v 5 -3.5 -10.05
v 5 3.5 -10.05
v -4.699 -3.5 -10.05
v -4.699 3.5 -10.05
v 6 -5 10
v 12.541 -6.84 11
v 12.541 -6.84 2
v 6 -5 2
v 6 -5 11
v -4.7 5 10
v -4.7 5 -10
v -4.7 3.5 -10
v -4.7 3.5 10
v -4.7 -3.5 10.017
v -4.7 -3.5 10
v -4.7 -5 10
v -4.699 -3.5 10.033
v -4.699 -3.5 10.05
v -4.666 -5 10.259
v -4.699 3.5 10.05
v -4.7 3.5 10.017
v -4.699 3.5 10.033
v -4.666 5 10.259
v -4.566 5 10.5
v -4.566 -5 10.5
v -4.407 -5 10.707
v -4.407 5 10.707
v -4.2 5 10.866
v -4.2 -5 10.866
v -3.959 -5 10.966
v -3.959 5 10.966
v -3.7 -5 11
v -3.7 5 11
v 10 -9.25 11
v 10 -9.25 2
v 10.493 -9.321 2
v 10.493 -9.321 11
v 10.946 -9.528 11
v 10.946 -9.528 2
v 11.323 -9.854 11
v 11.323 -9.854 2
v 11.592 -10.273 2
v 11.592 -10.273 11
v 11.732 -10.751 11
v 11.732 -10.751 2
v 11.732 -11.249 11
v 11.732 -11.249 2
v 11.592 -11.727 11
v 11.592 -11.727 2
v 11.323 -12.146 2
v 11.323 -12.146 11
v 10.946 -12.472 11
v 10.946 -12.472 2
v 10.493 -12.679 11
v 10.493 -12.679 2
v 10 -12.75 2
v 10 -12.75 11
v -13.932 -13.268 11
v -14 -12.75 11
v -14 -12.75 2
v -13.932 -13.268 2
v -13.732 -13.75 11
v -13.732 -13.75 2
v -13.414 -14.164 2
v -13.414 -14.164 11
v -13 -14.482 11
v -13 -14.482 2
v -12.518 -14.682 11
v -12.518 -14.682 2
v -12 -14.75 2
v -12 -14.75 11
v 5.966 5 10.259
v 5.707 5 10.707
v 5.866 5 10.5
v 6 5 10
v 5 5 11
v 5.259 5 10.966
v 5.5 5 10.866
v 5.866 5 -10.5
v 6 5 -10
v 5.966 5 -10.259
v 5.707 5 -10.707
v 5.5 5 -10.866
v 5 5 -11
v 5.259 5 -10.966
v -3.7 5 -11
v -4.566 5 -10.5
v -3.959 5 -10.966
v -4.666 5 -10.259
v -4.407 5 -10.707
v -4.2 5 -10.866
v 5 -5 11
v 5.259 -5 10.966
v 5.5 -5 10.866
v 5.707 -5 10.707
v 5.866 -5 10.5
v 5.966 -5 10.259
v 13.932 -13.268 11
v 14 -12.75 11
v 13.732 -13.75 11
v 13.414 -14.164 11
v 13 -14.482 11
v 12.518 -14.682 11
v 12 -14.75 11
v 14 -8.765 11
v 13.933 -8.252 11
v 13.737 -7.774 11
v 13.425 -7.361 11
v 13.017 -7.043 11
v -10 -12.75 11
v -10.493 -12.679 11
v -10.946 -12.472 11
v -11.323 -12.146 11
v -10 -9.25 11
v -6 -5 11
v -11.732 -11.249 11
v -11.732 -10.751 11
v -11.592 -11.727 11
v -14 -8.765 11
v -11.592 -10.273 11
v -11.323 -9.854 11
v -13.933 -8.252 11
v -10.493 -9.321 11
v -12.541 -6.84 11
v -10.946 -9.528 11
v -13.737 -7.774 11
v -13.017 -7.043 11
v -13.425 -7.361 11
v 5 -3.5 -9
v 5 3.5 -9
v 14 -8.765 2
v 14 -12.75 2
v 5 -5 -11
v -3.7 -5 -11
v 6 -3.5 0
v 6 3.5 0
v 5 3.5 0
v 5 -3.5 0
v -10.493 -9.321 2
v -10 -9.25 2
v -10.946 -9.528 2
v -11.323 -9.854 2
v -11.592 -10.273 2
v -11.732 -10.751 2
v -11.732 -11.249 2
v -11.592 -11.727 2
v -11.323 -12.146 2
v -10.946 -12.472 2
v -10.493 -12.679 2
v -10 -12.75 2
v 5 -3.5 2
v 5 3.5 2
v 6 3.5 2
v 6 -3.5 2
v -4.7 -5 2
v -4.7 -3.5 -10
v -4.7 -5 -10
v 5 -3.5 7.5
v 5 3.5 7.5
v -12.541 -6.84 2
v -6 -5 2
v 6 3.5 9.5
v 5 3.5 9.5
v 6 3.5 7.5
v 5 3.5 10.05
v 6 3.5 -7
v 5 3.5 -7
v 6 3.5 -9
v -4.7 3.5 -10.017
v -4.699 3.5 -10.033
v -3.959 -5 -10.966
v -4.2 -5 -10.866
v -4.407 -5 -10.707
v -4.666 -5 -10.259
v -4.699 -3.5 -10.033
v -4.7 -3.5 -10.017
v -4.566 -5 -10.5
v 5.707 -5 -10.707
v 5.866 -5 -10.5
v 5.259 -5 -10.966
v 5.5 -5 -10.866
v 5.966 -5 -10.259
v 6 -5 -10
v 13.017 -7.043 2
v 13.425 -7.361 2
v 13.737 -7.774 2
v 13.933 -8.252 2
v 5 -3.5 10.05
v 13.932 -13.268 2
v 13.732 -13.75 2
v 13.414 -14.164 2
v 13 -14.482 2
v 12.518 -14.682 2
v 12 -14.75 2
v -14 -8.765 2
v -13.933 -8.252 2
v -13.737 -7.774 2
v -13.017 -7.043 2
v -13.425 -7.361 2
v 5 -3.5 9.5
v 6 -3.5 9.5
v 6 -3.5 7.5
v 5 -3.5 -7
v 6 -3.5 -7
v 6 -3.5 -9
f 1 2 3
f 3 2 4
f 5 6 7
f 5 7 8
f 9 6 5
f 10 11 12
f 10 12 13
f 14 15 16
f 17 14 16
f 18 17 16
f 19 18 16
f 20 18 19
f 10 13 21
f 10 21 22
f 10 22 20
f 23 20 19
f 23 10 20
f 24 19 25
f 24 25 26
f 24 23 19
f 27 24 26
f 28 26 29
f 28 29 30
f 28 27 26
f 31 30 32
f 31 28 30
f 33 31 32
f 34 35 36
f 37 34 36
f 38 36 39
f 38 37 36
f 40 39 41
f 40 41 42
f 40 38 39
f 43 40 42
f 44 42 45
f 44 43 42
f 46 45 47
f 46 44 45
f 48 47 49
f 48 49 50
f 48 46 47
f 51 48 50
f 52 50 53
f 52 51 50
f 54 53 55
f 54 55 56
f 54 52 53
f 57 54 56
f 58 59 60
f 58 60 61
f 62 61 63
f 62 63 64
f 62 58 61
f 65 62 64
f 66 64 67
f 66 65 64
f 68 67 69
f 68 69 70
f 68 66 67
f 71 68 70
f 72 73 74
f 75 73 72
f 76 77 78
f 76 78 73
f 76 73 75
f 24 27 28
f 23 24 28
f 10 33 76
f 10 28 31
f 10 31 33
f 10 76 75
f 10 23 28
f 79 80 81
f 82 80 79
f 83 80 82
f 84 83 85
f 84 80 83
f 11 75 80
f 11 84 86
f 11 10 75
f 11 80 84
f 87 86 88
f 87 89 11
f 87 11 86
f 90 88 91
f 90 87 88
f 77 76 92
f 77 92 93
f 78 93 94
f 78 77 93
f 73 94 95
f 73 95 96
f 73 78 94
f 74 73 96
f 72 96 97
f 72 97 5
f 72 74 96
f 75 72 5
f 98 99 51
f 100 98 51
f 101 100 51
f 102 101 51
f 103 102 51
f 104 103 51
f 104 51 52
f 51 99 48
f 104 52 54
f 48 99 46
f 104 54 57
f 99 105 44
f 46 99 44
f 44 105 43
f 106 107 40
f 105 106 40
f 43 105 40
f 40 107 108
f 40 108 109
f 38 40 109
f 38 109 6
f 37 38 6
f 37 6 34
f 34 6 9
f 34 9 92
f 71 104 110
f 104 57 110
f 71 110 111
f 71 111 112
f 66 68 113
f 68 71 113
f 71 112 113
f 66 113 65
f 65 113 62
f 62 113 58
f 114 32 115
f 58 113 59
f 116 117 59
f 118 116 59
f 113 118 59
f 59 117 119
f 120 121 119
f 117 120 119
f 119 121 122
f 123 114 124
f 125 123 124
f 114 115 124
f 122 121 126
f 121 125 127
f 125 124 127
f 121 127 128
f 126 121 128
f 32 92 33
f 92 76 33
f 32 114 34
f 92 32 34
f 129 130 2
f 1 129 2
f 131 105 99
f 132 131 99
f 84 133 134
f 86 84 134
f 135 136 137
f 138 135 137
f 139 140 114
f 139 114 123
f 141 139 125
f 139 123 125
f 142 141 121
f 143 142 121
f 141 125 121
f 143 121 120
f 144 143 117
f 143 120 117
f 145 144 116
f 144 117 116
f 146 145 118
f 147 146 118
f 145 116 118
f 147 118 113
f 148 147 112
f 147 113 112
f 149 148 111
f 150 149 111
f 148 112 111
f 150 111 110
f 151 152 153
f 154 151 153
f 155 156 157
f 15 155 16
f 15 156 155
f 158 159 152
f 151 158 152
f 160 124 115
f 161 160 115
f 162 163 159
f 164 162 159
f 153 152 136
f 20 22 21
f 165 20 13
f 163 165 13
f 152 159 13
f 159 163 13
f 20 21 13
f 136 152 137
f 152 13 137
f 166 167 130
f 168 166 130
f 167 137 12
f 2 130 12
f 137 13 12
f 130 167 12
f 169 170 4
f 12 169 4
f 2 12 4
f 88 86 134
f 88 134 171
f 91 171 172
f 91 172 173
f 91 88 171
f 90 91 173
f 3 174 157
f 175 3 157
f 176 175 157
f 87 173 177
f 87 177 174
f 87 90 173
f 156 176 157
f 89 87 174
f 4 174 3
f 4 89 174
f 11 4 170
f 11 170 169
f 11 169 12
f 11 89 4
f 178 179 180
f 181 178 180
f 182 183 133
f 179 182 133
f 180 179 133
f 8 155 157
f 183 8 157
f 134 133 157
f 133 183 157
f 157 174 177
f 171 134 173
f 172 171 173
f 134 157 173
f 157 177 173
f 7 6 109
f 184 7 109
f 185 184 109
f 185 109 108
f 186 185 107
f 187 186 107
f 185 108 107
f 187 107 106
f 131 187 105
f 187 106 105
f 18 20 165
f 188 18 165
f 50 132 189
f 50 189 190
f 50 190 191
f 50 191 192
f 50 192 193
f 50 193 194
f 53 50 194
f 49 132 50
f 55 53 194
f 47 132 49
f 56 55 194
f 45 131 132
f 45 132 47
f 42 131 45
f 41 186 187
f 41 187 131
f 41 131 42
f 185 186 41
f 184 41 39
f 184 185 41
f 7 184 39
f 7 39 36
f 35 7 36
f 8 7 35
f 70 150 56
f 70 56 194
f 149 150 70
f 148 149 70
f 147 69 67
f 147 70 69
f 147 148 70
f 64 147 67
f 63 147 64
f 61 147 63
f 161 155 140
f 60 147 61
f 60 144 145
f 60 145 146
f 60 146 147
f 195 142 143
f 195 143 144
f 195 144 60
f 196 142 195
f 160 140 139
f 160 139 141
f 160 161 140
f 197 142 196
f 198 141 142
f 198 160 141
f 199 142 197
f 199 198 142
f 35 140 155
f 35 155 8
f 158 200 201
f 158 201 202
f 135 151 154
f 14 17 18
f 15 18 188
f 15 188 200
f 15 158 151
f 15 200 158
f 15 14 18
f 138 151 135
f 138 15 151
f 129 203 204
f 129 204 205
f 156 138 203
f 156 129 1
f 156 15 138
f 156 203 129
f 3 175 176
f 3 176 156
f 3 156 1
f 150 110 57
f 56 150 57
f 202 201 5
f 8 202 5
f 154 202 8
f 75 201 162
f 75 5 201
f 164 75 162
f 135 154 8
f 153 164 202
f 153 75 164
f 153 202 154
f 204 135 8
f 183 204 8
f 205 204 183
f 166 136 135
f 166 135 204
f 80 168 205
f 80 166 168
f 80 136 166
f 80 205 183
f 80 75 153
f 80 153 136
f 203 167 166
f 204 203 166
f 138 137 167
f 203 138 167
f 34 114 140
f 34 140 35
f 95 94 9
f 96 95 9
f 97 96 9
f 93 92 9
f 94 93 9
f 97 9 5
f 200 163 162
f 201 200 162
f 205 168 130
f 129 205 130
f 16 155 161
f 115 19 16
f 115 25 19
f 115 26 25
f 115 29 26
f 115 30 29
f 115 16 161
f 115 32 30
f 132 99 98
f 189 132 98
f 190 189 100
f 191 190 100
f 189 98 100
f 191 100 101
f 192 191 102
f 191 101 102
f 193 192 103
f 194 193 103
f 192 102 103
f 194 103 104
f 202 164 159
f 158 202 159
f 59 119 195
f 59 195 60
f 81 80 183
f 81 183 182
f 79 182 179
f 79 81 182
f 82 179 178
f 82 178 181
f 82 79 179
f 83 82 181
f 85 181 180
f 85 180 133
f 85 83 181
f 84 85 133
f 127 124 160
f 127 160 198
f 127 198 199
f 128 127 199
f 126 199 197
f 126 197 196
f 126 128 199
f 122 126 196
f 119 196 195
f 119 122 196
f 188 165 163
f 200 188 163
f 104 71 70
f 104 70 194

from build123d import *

# Parameters (mm, degrees)
PAD120_DEPTH            = 5
POCKET099_DEPTH         = 3.5
PAD124_DEPTH            = 9
BODY087_PITCH_ANGLE     = 90
BODY087_PLACEMENT_ANGLE = 90


with BuildPart() as part:
    # Sketch244 → Pad120 (new body, symmetric)
    with BuildSketch(Plane.XY):
        with BuildLine():
            Line((-11, 3.7), (-11, -5))
            ThreePointArc((-11, -5), (-10.707107, -5.707107), (-10, -6))
            Line((-10, -6), (10, -6))
            ThreePointArc((10, -6), (10.707107, -5.707107), (11, -5))
            Line((11, -5), (11, 3.7))
            ThreePointArc((11, 3.7), (10.707107, 4.407107), (10, 4.7))
            Line((10, 4.7), (-10, 4.7))
            ThreePointArc((-10, 4.7), (-10.707107, 4.407107), (-11, 3.7))
        make_face()
    extrude(amount=PAD120_DEPTH, both=True)

    # Sketch245 → Pocket099 (cut, symmetric)
    with BuildSketch(Plane.XY):
        Polygon((-10.05, 10), (-10.05, -5), (-9.5, -5), (-9.5, -12), (-7.5, -12), (-7.5, -5), (-2, -5), (-2, -12), (0, -12), (0, -5), (7, -5), (7, -12), (9, -12), (9, -5), (10.05, -5), (10.05, 10), align=None)
    extrude(amount=POCKET099_DEPTH, both=True, mode=Mode.SUBTRACT)

    # Sketch253 (on Face1 of Pocket099) → Pad124 (join)
    with BuildSketch(Plane.YZ.offset(-11)):
        with BuildLine():
            ThreePointArc((-10, -9.25), (-11.75, -11), (-10, -12.75))
            Line((-10, -12.75), (0, -12.75))
            Line((0, -14.75), (0, -12.75))
            Line((-12, -14.75), (0, -14.75))
            ThreePointArc((-14, -12.75), (-13.414214, -14.164214), (-12, -14.75))
            Line((-14, -8.765096), (-14, -12.75))
            ThreePointArc((-12.541491, -6.839794), (-13.594205, -7.557409), (-14, -8.765096))
            Line((-12.541491, -6.839794), (-6, -5))
            Line((0, -5), (-6, -5))
            Line((0, -9.25), (0, -5))
            Line((-10, -9.25), (0, -9.25))
        make_face()
    pad124 = extrude(amount=PAD124_DEPTH)

    # Mirrored012: Pad124 across Sketch253 V_Axis
    add(pad124.mirror(Plane(origin=(-11, 0, 0), x_dir=(1, 0, 0), z_dir=(0, 1, 0))))


with BuildPart() as part_1:
    # Body087 pitch: moved
    add(part.part.rotate(Axis((0, 0, 0), (0, 1, 0)), BODY087_PITCH_ANGLE))


with BuildPart() as part_2:
    # Body087 placement: moved
    add(part_1.part.moved(Location((0, 0, 0))).rotate(Axis((0, 0, 0), (0, 0, 1)), BODY087_PLACEMENT_ANGLE))


solid = part_2.part
